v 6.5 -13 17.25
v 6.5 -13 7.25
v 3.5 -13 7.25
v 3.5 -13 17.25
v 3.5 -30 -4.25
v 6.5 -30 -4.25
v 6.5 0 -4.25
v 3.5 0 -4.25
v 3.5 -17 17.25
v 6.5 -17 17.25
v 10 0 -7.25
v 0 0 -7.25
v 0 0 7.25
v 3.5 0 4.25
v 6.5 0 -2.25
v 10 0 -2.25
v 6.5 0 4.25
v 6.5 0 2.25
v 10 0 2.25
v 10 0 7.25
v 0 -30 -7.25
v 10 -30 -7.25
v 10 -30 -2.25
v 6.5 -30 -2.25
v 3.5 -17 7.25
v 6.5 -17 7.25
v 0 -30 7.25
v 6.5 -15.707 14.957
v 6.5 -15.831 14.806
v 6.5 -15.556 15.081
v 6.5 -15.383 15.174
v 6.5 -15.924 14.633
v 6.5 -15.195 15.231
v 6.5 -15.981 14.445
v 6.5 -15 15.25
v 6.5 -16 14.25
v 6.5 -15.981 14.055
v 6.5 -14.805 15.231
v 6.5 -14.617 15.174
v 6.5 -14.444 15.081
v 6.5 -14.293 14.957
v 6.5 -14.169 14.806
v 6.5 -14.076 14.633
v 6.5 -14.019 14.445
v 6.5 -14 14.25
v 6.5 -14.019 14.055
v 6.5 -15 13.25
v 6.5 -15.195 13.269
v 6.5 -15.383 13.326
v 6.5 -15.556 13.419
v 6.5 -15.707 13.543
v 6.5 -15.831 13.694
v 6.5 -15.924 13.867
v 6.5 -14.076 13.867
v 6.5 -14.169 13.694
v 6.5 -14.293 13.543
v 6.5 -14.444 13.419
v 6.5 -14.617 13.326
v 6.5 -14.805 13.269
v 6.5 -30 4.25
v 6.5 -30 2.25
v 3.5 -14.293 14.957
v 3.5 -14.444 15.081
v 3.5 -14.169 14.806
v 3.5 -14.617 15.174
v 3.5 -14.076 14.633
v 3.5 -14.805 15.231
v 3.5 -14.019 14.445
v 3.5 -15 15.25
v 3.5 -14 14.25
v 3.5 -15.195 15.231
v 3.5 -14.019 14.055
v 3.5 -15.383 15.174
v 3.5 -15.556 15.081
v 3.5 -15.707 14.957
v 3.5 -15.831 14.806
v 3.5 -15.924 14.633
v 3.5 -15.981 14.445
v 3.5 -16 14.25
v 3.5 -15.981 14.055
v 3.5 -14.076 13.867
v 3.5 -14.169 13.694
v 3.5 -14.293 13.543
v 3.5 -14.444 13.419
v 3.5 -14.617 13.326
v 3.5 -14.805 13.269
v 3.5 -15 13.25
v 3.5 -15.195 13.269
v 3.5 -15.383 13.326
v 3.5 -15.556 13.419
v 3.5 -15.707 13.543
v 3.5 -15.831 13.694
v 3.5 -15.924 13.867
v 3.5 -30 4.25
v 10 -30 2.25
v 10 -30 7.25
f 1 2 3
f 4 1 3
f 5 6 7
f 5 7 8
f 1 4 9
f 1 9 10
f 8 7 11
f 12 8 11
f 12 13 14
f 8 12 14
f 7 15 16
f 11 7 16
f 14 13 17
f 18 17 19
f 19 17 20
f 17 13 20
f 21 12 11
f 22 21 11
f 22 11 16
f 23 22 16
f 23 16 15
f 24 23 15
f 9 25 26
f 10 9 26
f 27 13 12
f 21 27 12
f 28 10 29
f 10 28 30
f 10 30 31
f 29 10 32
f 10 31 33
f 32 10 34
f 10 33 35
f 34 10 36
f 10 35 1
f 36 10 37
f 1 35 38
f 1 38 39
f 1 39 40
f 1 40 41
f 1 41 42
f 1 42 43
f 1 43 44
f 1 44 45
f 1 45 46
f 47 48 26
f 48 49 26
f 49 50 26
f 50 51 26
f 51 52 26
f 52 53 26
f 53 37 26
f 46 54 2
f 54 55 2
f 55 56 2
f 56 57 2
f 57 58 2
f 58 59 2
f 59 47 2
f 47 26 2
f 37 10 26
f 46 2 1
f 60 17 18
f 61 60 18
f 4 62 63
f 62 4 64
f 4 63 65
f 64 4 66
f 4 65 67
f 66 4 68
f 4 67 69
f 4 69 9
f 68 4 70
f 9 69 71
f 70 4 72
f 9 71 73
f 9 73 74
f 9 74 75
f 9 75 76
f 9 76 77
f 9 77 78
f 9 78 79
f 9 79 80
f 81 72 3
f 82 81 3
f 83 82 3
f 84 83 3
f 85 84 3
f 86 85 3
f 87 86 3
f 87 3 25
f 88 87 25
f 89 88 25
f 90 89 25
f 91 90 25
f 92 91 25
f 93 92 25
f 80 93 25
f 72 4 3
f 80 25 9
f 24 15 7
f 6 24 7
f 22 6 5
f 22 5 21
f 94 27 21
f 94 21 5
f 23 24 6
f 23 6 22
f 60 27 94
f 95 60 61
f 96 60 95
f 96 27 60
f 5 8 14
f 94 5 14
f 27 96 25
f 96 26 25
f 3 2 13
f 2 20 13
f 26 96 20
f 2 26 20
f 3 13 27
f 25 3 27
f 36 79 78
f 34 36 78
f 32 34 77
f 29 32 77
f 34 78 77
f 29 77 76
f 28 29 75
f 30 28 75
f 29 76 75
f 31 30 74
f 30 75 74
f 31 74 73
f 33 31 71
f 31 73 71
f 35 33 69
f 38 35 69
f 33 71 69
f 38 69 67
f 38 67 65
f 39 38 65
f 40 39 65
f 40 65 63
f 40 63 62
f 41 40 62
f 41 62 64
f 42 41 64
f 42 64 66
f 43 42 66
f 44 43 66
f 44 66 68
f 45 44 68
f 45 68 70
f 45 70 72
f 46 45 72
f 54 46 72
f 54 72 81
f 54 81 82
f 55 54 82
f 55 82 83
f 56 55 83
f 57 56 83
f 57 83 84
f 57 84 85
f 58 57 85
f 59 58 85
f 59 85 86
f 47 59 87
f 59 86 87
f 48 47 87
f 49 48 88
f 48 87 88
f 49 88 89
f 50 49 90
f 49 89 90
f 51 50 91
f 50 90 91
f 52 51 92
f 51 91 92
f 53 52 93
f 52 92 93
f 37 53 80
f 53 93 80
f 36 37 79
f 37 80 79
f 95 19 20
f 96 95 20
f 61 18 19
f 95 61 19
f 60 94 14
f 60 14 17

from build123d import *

# Parameters (mm, degrees)
F1_DEPTH = 30
F3_DEPTH = 10
F4_R     = 1
F5_DEPTH = 5


with BuildPart() as f1:
    # F0 (on Front) → F1 (new body)
    with BuildSketch(Plane.XZ):
        Polygon((0, 7.25), (0, 0), (0, -7.25), (10, -7.25), (10, -2.25), (6.5, -2.25), (6.5, -4.25), (3.5, -4.25), (3.5, 0), (3.5, 4.25), (6.5, 4.25), (6.5, 2.25), (10, 2.25), (10, 7.25), align=None)
    extrude(amount=F1_DEPTH)

    # F2 (on face) → F3 (join)
    with BuildSketch(Plane.XY.offset(7.25)):
        Polygon((6.5, -13), (5, -13), (3.5, -13), (3.5, -15), (3.5, -17), (5, -17), (6.5, -17), (6.5, -15), align=None)
    extrude(amount=F3_DEPTH)

    # F4 (on face) → F5 (cut)
    with BuildSketch(Plane(origin=(3.5, 0, 0), x_dir=(0, -1, 0), z_dir=(-1, 0, 0))):
        with Locations((15, 14.25)):
            Circle(F4_R)
    extrude(amount=-F5_DEPTH, mode=Mode.SUBTRACT)


solid = f1.part
